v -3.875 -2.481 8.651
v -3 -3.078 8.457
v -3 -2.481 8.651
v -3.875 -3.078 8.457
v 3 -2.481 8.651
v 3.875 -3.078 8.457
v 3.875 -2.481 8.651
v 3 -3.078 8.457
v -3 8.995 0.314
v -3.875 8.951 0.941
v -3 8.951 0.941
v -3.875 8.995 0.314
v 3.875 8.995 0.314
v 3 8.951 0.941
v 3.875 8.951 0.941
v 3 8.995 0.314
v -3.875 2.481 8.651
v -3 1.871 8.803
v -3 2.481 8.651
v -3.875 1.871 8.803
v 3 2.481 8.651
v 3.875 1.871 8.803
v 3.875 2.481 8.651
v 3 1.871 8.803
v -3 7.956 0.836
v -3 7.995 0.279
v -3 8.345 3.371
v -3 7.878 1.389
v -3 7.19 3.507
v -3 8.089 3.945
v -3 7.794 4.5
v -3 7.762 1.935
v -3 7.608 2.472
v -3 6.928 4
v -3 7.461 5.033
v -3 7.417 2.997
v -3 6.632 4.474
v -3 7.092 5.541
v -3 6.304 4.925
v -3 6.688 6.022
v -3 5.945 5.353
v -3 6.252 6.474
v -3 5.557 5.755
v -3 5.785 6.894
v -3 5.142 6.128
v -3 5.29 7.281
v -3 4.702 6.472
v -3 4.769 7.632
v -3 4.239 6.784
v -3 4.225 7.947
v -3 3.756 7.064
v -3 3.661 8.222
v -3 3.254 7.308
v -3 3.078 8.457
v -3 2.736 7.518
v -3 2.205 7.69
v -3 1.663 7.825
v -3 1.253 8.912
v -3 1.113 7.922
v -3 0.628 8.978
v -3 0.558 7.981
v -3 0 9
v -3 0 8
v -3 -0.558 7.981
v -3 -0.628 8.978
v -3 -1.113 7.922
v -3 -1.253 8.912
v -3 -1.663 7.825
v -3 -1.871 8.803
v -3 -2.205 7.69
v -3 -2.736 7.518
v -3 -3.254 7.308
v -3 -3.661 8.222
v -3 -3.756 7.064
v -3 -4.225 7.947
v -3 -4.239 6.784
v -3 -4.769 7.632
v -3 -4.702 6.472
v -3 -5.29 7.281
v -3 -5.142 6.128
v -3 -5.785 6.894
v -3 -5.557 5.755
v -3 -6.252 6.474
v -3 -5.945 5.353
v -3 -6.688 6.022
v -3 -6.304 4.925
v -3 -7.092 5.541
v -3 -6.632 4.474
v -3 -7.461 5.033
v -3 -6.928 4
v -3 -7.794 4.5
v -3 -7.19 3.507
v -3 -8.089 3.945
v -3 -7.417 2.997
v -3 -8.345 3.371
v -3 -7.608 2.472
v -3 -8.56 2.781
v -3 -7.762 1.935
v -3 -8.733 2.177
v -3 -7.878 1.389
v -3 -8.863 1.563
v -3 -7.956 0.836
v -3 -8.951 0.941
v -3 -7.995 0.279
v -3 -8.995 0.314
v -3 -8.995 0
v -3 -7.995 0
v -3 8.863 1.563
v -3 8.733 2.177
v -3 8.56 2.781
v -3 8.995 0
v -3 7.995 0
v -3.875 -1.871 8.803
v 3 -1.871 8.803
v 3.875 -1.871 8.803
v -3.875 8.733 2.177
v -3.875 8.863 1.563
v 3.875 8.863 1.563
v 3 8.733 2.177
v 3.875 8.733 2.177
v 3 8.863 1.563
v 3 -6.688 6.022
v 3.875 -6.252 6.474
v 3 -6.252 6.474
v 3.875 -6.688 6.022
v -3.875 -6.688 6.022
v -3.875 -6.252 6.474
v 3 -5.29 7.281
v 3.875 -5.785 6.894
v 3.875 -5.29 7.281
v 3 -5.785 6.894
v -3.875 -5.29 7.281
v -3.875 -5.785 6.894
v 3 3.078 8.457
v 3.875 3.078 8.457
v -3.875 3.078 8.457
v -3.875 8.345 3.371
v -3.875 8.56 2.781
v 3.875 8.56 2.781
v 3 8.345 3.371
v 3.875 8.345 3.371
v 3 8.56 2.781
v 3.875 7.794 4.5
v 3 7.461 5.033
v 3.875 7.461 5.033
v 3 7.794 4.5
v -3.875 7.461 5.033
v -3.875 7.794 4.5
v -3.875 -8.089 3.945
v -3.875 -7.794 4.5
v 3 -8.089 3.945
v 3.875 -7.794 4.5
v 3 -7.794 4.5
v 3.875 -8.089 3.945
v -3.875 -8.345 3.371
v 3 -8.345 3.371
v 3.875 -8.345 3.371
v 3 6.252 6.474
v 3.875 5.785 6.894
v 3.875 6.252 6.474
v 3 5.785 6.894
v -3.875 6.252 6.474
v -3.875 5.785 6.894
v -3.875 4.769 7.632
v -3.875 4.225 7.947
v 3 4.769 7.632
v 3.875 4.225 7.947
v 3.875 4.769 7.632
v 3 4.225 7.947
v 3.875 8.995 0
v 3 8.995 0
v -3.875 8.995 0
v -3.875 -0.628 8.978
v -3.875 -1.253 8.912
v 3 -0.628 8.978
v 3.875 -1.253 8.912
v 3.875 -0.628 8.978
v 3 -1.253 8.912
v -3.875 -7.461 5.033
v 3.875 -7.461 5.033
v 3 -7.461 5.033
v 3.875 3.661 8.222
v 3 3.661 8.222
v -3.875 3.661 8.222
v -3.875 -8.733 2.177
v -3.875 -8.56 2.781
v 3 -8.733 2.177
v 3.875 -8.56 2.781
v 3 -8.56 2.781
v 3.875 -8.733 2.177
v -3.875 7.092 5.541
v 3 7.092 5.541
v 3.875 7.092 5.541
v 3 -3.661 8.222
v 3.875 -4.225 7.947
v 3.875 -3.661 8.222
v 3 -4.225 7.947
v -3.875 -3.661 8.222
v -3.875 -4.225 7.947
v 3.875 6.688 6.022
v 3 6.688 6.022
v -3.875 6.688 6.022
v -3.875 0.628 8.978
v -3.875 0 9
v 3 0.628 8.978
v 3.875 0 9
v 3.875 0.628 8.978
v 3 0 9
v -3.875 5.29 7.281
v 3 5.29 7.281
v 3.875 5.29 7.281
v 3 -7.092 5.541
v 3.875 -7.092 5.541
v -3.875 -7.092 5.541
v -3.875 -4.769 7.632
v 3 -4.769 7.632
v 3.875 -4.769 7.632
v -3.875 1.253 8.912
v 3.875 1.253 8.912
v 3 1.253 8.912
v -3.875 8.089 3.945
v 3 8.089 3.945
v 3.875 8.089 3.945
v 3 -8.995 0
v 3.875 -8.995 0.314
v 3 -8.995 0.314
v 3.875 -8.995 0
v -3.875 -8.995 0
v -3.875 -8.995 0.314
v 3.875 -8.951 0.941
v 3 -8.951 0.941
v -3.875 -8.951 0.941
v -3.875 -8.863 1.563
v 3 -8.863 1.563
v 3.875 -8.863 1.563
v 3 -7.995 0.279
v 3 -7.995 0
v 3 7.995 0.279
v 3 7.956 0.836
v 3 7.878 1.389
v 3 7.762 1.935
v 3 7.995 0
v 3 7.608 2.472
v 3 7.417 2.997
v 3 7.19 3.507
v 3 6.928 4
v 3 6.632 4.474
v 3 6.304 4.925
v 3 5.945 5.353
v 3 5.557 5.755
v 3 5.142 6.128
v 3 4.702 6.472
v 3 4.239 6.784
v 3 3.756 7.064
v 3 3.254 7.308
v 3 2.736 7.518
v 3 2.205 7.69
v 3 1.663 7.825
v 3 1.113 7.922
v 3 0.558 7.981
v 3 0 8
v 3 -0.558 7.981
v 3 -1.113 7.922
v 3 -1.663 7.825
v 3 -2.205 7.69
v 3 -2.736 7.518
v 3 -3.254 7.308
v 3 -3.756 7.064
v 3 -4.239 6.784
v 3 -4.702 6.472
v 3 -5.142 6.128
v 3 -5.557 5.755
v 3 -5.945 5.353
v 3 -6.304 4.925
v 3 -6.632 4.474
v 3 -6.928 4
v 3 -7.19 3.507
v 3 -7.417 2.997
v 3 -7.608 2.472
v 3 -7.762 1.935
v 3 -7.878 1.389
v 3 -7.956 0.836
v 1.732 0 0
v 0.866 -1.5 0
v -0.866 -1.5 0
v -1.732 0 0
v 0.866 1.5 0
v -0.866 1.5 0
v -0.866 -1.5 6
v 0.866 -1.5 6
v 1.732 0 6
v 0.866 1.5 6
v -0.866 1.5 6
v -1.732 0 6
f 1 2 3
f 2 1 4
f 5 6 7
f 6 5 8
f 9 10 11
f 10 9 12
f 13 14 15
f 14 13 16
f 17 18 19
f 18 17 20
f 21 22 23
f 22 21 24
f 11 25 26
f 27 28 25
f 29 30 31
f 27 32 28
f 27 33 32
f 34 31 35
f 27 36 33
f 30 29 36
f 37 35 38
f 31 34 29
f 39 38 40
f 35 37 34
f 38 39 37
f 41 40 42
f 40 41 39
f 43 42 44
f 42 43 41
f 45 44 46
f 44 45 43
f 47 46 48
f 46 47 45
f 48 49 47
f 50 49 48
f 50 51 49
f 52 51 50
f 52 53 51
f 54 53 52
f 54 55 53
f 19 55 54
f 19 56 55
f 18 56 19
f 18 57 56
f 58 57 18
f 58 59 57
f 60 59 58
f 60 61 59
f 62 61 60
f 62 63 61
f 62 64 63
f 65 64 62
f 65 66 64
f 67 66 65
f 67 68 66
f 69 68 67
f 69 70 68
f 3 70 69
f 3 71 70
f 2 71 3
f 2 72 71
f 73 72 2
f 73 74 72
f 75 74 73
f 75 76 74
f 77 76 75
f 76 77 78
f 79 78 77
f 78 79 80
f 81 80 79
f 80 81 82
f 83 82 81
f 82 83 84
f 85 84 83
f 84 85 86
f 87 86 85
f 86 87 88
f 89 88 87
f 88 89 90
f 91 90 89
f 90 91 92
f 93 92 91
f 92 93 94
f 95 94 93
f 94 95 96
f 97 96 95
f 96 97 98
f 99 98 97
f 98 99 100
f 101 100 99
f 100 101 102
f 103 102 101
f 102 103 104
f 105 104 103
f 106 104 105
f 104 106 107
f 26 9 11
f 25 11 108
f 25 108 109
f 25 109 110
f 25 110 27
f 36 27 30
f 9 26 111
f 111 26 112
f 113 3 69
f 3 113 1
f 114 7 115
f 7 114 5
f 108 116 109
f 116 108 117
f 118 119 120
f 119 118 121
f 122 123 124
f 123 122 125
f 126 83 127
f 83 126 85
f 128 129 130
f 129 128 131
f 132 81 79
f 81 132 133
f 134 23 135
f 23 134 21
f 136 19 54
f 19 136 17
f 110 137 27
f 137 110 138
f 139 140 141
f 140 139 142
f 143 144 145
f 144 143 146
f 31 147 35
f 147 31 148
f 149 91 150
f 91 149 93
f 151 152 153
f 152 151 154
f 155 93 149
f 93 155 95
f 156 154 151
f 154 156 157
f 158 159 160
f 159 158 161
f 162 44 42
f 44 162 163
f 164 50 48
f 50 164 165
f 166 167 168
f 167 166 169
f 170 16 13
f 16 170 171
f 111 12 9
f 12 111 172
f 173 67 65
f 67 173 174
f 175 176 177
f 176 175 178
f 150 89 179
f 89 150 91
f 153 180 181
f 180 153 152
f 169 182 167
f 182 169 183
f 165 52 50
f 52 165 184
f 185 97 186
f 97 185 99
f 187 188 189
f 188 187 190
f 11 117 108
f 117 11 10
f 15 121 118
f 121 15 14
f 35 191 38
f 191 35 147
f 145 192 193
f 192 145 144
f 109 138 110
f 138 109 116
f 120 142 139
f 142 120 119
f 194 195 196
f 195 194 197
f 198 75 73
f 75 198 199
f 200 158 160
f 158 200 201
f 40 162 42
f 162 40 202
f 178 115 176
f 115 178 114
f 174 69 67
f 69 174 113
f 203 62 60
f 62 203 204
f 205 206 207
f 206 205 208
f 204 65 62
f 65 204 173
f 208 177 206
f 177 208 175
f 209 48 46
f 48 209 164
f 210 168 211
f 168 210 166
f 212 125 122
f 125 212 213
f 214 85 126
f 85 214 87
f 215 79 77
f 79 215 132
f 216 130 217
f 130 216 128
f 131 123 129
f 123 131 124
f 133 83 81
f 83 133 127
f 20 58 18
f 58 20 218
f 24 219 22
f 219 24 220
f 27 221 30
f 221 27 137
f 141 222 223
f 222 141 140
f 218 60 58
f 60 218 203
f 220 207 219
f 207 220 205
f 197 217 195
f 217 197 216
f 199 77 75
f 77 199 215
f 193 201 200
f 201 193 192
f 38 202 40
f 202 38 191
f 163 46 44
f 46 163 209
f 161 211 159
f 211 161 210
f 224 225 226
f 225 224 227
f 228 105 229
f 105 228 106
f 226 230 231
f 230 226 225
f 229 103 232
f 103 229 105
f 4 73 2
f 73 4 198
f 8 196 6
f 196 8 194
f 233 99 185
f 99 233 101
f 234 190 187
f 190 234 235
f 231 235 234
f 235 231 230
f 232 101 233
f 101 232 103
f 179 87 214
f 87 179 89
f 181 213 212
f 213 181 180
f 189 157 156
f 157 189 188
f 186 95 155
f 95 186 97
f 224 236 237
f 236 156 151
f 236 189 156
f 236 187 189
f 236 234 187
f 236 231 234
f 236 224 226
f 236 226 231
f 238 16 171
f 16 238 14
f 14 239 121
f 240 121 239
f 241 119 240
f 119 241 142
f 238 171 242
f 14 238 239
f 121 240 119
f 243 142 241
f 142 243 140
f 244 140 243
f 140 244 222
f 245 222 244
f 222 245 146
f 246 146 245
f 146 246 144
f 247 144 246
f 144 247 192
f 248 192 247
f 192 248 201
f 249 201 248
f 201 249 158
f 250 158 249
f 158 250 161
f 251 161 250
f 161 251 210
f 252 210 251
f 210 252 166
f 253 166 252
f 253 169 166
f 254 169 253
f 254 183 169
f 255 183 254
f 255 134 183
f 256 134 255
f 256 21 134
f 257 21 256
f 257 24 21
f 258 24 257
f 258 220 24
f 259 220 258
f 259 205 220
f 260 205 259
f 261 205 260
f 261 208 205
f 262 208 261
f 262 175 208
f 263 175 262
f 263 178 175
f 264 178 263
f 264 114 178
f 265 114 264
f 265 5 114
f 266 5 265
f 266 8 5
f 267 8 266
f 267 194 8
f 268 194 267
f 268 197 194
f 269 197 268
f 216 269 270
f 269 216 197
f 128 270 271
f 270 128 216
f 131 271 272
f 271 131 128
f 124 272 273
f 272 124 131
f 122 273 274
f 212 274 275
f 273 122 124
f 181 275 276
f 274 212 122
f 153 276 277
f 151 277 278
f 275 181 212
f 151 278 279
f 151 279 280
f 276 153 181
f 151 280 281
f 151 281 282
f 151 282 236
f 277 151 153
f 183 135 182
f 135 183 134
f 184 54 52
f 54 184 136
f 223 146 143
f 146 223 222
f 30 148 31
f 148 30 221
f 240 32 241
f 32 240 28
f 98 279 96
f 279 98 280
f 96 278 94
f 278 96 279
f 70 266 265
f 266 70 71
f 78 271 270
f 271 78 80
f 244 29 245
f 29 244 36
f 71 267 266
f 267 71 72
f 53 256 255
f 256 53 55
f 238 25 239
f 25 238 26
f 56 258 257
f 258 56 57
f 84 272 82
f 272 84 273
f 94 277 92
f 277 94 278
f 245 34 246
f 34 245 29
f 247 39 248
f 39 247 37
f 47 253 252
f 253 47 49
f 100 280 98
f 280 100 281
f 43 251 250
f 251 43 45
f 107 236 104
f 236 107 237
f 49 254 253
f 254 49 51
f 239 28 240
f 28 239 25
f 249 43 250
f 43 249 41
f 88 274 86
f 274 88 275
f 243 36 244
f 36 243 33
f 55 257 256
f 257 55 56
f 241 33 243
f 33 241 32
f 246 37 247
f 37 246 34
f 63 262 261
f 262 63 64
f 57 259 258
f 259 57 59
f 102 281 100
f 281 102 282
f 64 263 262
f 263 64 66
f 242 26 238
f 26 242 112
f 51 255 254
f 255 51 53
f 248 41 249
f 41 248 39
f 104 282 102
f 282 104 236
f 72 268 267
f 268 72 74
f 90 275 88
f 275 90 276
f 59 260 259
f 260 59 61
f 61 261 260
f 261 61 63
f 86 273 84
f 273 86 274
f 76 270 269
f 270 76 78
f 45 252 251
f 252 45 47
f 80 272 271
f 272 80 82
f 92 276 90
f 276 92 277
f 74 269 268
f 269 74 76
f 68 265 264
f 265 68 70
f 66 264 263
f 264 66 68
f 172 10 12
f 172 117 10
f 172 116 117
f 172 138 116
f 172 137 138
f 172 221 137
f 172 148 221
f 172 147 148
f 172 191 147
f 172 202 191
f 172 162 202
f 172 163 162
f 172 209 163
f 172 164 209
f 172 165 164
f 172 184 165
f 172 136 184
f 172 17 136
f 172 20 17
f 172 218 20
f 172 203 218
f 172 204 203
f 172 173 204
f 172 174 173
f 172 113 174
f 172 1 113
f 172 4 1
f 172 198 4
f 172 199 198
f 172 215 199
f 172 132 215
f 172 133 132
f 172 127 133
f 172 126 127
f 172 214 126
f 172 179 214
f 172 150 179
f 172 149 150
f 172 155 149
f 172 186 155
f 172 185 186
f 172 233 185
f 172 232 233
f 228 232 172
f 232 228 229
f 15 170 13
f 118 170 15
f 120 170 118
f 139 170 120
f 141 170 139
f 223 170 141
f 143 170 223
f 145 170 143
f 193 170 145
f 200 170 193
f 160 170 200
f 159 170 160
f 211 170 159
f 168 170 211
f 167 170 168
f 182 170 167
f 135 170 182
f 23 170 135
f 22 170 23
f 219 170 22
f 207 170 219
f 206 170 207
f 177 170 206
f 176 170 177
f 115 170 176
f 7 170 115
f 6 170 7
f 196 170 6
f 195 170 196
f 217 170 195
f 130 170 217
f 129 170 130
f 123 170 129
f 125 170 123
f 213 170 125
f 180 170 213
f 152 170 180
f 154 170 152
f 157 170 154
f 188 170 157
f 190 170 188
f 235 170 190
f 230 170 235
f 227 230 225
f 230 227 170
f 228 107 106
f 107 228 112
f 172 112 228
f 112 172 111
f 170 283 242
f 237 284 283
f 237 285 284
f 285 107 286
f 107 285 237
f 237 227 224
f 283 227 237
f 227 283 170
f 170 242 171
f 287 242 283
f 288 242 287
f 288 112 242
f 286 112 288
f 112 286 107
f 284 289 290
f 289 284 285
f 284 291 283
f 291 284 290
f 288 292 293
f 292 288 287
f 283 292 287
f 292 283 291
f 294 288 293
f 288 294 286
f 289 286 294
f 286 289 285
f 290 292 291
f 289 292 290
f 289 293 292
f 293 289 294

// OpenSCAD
// file: polyhole.scad
// The Cylinder is dead! Long live the Cylinder!
// A module for a polyhole by radius, based on Nophead's work.

module polyhole(h, r)
{
    n = max(round(4 * r), 3);
    cylinder(h = h, r = r / cos(180 / n), $fn = n);
}
// main file
// A small shape used to tighten one belt on the carriage.

use<polyhole.scad>

BeltTensioner();

module BeltTensioner()
{
    difference()
    {
        rotate([0, 90, 0])
            cylinder(h = 7.75, r = 9, center = true, $fn = 90);
        translate([0, 0, -5])
            cube([30, 30, 10], center = true);
        difference()
        {
            rotate([0, 90, 0])
                cylinder(h = 6, r = 9, center = true, $fn = 90);
            rotate([0, 90, 0])
                cylinder(h = 6, r = 8, center = true, $fn = 90);
        }
        polyhole(6, 1.5);
    }
}
